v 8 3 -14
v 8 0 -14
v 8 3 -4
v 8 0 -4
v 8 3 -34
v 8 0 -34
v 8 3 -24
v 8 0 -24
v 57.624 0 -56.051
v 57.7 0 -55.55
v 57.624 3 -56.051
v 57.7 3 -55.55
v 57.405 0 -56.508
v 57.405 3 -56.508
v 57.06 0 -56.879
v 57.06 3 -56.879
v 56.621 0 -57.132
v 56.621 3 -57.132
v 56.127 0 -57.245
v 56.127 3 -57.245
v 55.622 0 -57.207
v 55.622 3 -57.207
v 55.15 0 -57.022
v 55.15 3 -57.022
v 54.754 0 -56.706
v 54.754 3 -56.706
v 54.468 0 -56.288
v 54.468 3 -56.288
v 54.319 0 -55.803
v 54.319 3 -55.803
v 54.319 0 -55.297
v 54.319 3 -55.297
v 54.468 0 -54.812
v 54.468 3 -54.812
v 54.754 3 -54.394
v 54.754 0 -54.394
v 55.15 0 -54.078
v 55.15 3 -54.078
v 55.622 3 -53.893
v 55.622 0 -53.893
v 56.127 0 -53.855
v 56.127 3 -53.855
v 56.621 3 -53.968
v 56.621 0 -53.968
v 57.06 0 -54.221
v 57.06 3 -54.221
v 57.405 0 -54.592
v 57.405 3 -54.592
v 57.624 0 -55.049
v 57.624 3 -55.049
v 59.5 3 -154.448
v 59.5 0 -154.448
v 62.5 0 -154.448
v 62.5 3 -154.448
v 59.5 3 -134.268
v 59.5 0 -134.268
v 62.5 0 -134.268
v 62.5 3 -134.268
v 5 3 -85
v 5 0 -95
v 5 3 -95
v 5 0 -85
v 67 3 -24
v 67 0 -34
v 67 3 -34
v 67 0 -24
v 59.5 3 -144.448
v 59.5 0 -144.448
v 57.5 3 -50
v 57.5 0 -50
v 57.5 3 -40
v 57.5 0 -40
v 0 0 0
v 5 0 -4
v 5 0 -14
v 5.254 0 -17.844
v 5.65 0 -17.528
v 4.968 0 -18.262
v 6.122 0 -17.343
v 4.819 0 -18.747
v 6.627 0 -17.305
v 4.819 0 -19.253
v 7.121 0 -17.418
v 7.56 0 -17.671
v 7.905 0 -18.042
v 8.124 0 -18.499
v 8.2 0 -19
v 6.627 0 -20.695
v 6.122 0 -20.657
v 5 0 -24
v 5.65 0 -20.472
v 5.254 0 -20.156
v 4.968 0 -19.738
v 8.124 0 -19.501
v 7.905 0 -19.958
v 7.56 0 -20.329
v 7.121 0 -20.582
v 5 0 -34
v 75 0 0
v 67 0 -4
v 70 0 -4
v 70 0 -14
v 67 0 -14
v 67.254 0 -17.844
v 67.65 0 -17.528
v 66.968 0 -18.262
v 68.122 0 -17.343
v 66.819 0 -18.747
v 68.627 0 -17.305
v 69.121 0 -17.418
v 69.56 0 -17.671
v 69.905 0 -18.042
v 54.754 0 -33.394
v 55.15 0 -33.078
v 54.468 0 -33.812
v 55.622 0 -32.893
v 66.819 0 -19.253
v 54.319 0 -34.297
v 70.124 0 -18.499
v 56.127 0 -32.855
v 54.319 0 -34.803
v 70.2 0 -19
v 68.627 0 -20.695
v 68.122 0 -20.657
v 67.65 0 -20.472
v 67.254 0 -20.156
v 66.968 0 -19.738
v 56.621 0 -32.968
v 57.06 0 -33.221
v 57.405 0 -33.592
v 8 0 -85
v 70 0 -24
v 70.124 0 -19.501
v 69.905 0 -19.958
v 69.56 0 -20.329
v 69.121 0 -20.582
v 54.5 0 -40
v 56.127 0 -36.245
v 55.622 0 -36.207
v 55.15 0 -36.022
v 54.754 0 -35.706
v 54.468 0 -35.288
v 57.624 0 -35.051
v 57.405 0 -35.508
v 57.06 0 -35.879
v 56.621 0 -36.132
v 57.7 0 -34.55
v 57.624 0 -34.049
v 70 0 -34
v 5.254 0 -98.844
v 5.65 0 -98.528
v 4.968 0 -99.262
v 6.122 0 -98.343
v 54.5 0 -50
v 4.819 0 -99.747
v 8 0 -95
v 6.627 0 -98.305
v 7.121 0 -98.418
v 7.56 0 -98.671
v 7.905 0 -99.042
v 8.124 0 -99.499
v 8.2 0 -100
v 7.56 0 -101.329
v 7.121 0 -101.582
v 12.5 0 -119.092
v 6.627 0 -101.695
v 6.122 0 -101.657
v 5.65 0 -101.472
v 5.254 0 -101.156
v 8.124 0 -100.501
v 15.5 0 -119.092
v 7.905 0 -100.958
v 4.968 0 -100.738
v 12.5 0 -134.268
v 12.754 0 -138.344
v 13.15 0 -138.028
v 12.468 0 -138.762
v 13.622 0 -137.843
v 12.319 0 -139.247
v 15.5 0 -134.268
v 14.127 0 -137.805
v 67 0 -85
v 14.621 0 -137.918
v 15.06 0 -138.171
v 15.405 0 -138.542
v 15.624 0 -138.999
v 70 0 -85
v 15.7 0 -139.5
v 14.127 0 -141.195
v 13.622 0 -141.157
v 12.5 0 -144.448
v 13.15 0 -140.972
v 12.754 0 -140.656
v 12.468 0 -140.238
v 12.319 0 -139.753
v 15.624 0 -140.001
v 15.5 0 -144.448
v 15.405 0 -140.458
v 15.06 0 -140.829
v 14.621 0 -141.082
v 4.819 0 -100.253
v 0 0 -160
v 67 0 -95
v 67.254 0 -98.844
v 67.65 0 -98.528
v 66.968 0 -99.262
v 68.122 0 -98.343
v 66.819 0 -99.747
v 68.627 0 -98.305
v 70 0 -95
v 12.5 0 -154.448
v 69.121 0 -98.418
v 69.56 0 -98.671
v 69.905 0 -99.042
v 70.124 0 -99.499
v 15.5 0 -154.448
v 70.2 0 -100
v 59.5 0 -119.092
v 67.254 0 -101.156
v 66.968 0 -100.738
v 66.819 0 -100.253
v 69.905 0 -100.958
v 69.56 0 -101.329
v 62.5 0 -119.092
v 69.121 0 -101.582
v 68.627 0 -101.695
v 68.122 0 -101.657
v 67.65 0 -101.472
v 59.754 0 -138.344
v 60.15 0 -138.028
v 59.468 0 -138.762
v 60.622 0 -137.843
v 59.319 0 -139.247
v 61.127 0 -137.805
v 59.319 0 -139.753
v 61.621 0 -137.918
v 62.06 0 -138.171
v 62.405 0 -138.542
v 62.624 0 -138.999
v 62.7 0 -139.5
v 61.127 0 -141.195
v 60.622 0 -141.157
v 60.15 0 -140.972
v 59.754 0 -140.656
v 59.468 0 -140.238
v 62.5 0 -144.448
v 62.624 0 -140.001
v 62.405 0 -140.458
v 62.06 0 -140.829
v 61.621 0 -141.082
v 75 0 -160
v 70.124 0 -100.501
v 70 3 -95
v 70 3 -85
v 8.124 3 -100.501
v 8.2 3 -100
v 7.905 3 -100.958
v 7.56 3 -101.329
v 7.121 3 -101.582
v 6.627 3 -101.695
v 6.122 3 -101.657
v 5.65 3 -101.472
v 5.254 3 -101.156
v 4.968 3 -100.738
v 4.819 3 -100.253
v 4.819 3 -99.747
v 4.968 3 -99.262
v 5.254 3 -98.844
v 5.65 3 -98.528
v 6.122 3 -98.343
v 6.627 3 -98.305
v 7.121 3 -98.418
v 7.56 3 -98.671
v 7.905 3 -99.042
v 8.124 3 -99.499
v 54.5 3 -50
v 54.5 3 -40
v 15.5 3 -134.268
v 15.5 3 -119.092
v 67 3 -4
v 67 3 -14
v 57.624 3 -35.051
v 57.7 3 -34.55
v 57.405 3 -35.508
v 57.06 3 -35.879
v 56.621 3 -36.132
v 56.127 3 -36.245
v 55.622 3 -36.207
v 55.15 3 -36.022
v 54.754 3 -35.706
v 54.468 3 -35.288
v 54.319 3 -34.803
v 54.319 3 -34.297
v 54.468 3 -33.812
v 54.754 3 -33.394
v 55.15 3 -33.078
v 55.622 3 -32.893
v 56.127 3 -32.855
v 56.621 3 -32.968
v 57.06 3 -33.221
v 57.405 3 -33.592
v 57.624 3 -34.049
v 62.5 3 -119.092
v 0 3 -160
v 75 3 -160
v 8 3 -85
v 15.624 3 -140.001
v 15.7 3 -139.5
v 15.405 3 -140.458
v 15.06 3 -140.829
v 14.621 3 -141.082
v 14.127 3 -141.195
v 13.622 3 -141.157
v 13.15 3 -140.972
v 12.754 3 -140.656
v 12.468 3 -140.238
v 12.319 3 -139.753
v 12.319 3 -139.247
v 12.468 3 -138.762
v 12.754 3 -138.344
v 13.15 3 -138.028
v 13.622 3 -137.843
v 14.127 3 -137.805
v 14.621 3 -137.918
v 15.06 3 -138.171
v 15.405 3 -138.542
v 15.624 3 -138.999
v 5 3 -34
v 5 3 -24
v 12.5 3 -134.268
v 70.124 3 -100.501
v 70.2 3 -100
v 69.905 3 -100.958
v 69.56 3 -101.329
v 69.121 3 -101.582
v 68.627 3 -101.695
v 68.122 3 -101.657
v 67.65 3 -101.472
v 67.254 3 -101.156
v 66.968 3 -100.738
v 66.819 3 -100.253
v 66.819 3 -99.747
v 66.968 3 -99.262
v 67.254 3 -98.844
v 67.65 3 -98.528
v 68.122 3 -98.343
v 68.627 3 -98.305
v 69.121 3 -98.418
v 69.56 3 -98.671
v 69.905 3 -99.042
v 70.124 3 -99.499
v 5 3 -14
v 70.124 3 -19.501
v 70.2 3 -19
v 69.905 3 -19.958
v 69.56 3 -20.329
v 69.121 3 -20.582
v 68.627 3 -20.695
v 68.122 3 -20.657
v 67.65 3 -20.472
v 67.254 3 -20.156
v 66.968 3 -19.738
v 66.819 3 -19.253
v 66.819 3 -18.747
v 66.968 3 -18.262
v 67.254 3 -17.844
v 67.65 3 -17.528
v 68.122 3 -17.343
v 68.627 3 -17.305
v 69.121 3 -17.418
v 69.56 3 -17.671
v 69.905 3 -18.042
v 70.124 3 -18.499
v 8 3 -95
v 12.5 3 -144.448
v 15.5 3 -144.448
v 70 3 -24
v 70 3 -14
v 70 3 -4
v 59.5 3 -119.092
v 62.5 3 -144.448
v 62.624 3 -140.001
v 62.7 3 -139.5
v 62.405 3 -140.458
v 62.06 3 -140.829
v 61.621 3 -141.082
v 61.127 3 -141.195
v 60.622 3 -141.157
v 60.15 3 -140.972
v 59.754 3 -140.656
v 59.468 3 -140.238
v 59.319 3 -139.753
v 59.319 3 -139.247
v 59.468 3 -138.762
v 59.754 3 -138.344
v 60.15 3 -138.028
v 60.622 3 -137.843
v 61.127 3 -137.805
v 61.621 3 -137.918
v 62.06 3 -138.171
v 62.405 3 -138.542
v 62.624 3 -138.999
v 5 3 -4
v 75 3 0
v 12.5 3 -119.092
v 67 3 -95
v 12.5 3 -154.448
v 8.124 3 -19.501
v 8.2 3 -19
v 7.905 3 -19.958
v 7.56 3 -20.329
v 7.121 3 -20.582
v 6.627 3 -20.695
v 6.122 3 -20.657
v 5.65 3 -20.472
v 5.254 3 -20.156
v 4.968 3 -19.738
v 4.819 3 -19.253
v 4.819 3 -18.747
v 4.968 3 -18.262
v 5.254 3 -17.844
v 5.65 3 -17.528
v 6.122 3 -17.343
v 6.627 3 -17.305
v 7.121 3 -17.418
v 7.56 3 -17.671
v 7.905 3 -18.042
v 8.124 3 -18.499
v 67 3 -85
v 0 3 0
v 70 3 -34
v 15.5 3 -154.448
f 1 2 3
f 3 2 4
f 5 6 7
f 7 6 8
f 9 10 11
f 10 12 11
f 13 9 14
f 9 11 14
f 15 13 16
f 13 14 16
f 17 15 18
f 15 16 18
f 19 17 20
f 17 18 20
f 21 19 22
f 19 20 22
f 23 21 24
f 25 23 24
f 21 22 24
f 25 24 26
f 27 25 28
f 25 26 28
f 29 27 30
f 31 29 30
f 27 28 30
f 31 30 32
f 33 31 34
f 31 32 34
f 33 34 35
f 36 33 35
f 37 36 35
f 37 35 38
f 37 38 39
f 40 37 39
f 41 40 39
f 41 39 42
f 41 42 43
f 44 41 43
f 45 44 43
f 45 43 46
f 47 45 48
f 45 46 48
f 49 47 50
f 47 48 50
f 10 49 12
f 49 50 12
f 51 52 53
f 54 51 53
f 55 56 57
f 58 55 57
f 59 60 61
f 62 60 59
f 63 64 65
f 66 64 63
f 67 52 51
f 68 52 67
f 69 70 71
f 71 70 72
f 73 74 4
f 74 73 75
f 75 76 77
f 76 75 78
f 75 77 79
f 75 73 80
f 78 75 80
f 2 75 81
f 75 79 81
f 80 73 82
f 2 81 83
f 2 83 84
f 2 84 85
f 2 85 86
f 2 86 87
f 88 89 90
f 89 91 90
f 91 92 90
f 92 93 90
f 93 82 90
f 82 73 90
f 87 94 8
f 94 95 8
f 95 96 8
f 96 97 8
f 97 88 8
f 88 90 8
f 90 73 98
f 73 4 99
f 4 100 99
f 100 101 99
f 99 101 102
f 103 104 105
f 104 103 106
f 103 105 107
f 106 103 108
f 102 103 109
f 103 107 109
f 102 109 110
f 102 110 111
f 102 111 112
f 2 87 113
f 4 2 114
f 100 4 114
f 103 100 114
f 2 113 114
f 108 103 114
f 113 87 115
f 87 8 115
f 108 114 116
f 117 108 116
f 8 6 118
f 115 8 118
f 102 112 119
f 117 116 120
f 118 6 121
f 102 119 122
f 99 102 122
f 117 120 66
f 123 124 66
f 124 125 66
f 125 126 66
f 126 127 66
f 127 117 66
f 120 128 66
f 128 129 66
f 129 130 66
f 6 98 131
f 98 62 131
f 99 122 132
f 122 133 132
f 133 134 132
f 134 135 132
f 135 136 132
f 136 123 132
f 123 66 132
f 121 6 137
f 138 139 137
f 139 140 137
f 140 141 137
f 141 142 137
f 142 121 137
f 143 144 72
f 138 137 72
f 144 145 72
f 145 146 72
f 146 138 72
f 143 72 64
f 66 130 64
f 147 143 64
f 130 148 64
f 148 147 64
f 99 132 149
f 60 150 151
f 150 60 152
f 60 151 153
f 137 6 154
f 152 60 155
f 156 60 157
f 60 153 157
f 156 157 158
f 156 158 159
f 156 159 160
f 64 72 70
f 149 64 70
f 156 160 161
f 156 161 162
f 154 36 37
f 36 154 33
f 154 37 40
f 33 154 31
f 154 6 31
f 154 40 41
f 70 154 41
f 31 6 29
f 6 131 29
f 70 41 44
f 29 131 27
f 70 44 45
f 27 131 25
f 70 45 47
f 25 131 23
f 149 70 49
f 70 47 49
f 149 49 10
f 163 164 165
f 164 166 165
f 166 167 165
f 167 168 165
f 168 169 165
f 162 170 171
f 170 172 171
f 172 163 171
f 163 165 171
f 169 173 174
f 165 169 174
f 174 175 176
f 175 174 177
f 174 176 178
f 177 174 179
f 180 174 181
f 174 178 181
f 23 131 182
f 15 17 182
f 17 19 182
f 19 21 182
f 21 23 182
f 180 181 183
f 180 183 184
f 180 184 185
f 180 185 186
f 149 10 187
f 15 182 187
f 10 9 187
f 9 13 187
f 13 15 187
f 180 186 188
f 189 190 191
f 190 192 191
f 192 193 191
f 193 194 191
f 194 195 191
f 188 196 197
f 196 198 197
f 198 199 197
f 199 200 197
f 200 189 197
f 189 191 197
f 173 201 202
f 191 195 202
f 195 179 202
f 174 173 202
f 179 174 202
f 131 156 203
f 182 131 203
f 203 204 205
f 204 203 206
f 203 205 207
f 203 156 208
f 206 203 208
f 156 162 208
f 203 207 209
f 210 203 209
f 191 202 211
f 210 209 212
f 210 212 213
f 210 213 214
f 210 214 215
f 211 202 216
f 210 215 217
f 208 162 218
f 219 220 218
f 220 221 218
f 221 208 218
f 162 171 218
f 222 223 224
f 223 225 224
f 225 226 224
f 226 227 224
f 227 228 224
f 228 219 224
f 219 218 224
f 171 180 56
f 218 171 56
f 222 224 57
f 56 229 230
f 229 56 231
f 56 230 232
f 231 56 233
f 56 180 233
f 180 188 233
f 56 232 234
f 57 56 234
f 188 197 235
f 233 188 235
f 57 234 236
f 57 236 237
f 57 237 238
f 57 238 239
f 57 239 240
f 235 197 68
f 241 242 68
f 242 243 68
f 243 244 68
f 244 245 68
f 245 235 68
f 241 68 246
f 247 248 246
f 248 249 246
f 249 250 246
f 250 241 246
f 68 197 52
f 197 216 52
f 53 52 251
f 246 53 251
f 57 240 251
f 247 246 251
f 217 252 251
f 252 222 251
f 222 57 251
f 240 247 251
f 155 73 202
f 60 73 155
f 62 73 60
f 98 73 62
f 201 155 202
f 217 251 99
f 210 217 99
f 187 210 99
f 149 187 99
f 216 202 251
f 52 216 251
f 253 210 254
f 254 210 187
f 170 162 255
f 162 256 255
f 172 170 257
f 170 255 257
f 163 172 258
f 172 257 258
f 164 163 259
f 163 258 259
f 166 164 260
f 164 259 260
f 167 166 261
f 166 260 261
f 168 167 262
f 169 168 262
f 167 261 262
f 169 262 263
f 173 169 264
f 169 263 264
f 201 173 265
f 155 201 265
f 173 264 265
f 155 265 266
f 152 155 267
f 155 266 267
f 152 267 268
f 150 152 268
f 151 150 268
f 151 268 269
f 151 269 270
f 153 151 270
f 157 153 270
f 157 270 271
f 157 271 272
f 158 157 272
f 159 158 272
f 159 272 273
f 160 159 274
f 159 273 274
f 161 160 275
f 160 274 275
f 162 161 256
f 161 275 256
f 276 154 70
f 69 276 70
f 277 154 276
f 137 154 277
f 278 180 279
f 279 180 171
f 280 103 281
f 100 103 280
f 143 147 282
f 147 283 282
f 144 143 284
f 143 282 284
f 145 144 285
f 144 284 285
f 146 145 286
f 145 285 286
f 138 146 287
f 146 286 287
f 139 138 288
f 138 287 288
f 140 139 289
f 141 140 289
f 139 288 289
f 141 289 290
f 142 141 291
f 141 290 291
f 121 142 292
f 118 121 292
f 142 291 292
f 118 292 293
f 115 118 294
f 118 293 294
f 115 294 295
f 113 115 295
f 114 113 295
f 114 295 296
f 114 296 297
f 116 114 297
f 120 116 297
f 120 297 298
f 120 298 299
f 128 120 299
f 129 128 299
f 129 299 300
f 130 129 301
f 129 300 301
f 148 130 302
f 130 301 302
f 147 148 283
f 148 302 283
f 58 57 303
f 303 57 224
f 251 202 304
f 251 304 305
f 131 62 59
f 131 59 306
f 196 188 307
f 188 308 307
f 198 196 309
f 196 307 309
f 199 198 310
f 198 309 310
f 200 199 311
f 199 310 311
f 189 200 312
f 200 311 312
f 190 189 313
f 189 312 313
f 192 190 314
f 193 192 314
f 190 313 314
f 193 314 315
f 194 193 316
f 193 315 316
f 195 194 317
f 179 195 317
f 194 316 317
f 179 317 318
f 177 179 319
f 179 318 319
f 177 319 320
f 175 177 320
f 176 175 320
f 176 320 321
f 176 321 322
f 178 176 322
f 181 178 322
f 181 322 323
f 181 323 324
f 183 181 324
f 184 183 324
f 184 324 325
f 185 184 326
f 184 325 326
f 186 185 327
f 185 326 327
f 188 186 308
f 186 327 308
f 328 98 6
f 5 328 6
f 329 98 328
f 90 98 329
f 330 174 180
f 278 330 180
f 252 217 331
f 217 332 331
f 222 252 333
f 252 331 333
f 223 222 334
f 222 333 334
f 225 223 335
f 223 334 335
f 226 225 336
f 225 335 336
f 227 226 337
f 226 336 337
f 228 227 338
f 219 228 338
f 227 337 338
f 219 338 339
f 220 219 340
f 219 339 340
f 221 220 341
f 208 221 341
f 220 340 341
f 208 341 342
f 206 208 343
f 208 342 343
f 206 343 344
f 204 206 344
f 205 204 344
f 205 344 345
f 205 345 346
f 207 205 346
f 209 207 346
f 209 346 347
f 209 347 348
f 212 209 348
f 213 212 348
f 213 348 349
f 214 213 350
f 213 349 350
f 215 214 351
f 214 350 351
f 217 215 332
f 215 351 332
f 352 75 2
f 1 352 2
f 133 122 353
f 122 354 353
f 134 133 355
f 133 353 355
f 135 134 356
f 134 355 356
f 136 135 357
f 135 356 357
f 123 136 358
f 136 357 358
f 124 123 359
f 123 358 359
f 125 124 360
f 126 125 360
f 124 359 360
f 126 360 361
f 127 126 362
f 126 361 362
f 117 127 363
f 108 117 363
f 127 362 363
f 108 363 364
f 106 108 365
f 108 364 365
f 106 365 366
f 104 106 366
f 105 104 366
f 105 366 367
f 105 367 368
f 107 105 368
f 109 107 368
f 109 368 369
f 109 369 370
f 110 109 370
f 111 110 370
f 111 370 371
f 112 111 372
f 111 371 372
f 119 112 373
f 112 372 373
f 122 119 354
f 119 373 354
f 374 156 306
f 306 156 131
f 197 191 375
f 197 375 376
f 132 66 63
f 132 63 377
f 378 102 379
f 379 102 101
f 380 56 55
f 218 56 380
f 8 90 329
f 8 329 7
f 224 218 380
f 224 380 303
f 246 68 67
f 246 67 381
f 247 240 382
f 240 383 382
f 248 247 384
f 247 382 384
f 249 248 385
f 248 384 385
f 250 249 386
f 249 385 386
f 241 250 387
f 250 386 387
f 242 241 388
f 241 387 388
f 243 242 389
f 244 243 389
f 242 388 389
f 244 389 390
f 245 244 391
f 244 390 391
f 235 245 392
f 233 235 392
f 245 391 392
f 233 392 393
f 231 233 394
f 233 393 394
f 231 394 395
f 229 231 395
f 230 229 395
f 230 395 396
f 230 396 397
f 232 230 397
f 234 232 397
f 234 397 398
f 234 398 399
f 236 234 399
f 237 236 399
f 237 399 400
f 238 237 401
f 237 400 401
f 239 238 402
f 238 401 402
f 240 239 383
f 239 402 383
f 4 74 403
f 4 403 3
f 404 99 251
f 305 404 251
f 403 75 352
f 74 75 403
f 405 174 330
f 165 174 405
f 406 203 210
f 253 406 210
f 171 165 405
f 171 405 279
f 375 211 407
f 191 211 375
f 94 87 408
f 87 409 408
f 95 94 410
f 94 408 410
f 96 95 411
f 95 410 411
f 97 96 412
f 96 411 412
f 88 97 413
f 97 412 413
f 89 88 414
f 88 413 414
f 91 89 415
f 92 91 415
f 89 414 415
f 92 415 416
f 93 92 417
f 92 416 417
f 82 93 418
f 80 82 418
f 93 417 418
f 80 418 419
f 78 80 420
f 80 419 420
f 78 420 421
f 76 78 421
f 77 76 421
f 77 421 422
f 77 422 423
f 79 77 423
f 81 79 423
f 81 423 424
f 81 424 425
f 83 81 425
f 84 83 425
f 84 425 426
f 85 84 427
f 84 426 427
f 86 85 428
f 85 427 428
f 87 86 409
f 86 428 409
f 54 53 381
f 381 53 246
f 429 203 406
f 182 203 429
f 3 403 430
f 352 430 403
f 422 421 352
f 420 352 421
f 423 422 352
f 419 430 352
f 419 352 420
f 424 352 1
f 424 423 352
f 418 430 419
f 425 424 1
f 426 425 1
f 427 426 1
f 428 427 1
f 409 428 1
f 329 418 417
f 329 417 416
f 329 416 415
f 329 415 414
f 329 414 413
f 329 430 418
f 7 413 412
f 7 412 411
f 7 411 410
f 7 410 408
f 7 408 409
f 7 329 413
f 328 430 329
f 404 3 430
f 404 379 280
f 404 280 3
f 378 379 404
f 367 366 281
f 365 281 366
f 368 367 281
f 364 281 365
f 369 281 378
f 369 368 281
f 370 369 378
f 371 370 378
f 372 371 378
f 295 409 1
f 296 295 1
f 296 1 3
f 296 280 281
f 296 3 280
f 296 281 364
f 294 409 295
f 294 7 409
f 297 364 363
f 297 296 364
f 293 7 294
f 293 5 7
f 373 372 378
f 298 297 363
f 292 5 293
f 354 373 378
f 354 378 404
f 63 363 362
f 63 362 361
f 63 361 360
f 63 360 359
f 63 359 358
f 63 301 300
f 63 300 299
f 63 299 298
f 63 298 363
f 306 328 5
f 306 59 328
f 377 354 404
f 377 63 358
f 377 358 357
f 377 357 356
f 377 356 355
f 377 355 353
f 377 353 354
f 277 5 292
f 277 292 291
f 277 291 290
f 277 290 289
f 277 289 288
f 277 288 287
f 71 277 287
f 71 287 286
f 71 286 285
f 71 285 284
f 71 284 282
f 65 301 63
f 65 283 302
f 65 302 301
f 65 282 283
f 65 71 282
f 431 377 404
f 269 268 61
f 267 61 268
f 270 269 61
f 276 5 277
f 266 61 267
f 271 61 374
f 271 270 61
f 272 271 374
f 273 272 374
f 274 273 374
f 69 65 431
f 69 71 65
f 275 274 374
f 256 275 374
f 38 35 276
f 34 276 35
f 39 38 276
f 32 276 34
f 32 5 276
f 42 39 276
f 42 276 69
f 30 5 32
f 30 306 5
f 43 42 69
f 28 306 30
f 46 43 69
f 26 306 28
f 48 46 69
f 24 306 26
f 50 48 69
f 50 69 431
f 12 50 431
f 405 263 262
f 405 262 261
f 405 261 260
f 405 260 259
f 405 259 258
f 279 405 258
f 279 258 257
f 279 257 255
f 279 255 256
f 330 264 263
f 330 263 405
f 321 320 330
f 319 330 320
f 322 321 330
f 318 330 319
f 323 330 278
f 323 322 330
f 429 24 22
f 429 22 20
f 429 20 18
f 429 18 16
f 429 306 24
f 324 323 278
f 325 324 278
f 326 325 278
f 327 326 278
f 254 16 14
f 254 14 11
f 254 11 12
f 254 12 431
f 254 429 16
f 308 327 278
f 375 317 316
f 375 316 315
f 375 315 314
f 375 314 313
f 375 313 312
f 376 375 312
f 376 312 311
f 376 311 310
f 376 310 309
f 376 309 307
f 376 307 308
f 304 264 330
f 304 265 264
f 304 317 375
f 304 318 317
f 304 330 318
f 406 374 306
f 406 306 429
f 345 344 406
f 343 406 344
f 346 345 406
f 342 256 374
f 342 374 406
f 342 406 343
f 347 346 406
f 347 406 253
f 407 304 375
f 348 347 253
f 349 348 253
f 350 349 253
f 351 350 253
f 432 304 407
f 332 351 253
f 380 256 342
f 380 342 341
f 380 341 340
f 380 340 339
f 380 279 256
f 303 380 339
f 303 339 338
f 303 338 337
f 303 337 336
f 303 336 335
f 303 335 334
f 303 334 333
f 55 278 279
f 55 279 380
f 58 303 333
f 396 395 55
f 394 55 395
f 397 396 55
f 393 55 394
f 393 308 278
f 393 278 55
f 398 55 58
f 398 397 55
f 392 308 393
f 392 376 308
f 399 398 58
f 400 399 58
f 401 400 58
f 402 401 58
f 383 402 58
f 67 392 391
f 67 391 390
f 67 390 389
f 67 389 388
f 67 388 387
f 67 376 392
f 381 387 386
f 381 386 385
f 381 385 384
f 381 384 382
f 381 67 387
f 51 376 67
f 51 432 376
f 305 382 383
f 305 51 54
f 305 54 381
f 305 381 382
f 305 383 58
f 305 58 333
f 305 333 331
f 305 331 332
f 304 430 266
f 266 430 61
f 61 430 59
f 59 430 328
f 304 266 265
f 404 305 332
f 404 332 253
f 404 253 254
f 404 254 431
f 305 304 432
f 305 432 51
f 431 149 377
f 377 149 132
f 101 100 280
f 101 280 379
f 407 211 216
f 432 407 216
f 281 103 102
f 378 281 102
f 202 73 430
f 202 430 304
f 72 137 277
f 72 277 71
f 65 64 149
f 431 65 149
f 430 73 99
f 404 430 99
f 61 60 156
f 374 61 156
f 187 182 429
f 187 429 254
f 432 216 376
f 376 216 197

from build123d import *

# Parameters (mm, degrees)
SKETCH1_W                = 75
SKETCH1_H                = 160
BOSS_EXTRUDE1_DEPTH      = 3
M3_CLEARANCE_HOLE1_D     = 3.4
M3_CLEARANCE_HOLE1_DEPTH = 3
M3_CLEARANCE_HOLE1_TIP   = 1.021463052
SKETCH6_W                = 3
SKETCH6_H                = 10
SKETCH6_H_2              = 15.175339059
CUT_EXTRUDE3_DEPTH       = 10
SKETCH7_W                = 3
SKETCH7_H                = 10
CUT_EXTRUDE4_DEPTH       = 10


with BuildPart() as part:
    # Sketch1 → Boss-Extrude1 (new body)
    with BuildSketch(Plane(origin=(0, 0, 0), x_dir=(1, 0, 0), z_dir=(0, 1, 0))):
        with Locations((37.5, 80)):
            Rectangle(SKETCH1_W, SKETCH1_H)
    extrude(amount=BOSS_EXTRUDE1_DEPTH)

    # M3 Clearance Hole1
    with Locations(Plane(origin=(0, 0, 0), x_dir=(-1, 0, 0), z_dir=(0, -1, 0))):
        with Locations((-68.5, 19), (-56, 55.55), (-56, 34.55), (-6.5, 19), (-61, 139.5), (-14, 139.5), (-6.5, 100), (-68.5, 100)):
            Hole(M3_CLEARANCE_HOLE1_D / 2, depth=M3_CLEARANCE_HOLE1_DEPTH)
            with Locations((0, 0, -(M3_CLEARANCE_HOLE1_DEPTH + M3_CLEARANCE_HOLE1_TIP / 2))):  # 118° drill point
                Cone(0, M3_CLEARANCE_HOLE1_D / 2, M3_CLEARANCE_HOLE1_TIP, mode=Mode.SUBTRACT)

    # Sketch6 → Cut-Extrude3 (cut)
    with BuildSketch(Plane.XZ):
        with Locations((61, -149.447708573)):
            Rectangle(SKETCH6_W, SKETCH6_H)
        with Locations((61, -126.680039044)):
            Rectangle(SKETCH6_W, SKETCH6_H_2)
        with Locations((14, -149.447708573)):
            Rectangle(SKETCH6_W, SKETCH6_H)
        with Locations((14, -126.680039044)):
            Rectangle(SKETCH6_W, SKETCH6_H_2)
    extrude(amount=-CUT_EXTRUDE3_DEPTH, mode=Mode.SUBTRACT)

    # Sketch7 → Cut-Extrude4 (cut)
    with BuildSketch(Plane.XZ):
        with Locations((6.5, -9)):
            Rectangle(SKETCH7_W, SKETCH7_H)
        with Locations((6.5, -29)):
            Rectangle(SKETCH7_W, SKETCH7_H)
        with Locations((68.5, -29)):
            Rectangle(SKETCH7_W, SKETCH7_H)
        with Locations((68.5, -9)):
            Rectangle(SKETCH7_W, SKETCH7_H)
        with Locations((56, -45)):
            Rectangle(SKETCH7_W, SKETCH7_H)
        with Locations((6.5, -90)):
            Rectangle(SKETCH7_W, SKETCH7_H)
        with Locations((68.5, -90)):
            Rectangle(SKETCH7_W, SKETCH7_H)
    extrude(amount=-CUT_EXTRUDE4_DEPTH, mode=Mode.SUBTRACT)


solid = part.part
